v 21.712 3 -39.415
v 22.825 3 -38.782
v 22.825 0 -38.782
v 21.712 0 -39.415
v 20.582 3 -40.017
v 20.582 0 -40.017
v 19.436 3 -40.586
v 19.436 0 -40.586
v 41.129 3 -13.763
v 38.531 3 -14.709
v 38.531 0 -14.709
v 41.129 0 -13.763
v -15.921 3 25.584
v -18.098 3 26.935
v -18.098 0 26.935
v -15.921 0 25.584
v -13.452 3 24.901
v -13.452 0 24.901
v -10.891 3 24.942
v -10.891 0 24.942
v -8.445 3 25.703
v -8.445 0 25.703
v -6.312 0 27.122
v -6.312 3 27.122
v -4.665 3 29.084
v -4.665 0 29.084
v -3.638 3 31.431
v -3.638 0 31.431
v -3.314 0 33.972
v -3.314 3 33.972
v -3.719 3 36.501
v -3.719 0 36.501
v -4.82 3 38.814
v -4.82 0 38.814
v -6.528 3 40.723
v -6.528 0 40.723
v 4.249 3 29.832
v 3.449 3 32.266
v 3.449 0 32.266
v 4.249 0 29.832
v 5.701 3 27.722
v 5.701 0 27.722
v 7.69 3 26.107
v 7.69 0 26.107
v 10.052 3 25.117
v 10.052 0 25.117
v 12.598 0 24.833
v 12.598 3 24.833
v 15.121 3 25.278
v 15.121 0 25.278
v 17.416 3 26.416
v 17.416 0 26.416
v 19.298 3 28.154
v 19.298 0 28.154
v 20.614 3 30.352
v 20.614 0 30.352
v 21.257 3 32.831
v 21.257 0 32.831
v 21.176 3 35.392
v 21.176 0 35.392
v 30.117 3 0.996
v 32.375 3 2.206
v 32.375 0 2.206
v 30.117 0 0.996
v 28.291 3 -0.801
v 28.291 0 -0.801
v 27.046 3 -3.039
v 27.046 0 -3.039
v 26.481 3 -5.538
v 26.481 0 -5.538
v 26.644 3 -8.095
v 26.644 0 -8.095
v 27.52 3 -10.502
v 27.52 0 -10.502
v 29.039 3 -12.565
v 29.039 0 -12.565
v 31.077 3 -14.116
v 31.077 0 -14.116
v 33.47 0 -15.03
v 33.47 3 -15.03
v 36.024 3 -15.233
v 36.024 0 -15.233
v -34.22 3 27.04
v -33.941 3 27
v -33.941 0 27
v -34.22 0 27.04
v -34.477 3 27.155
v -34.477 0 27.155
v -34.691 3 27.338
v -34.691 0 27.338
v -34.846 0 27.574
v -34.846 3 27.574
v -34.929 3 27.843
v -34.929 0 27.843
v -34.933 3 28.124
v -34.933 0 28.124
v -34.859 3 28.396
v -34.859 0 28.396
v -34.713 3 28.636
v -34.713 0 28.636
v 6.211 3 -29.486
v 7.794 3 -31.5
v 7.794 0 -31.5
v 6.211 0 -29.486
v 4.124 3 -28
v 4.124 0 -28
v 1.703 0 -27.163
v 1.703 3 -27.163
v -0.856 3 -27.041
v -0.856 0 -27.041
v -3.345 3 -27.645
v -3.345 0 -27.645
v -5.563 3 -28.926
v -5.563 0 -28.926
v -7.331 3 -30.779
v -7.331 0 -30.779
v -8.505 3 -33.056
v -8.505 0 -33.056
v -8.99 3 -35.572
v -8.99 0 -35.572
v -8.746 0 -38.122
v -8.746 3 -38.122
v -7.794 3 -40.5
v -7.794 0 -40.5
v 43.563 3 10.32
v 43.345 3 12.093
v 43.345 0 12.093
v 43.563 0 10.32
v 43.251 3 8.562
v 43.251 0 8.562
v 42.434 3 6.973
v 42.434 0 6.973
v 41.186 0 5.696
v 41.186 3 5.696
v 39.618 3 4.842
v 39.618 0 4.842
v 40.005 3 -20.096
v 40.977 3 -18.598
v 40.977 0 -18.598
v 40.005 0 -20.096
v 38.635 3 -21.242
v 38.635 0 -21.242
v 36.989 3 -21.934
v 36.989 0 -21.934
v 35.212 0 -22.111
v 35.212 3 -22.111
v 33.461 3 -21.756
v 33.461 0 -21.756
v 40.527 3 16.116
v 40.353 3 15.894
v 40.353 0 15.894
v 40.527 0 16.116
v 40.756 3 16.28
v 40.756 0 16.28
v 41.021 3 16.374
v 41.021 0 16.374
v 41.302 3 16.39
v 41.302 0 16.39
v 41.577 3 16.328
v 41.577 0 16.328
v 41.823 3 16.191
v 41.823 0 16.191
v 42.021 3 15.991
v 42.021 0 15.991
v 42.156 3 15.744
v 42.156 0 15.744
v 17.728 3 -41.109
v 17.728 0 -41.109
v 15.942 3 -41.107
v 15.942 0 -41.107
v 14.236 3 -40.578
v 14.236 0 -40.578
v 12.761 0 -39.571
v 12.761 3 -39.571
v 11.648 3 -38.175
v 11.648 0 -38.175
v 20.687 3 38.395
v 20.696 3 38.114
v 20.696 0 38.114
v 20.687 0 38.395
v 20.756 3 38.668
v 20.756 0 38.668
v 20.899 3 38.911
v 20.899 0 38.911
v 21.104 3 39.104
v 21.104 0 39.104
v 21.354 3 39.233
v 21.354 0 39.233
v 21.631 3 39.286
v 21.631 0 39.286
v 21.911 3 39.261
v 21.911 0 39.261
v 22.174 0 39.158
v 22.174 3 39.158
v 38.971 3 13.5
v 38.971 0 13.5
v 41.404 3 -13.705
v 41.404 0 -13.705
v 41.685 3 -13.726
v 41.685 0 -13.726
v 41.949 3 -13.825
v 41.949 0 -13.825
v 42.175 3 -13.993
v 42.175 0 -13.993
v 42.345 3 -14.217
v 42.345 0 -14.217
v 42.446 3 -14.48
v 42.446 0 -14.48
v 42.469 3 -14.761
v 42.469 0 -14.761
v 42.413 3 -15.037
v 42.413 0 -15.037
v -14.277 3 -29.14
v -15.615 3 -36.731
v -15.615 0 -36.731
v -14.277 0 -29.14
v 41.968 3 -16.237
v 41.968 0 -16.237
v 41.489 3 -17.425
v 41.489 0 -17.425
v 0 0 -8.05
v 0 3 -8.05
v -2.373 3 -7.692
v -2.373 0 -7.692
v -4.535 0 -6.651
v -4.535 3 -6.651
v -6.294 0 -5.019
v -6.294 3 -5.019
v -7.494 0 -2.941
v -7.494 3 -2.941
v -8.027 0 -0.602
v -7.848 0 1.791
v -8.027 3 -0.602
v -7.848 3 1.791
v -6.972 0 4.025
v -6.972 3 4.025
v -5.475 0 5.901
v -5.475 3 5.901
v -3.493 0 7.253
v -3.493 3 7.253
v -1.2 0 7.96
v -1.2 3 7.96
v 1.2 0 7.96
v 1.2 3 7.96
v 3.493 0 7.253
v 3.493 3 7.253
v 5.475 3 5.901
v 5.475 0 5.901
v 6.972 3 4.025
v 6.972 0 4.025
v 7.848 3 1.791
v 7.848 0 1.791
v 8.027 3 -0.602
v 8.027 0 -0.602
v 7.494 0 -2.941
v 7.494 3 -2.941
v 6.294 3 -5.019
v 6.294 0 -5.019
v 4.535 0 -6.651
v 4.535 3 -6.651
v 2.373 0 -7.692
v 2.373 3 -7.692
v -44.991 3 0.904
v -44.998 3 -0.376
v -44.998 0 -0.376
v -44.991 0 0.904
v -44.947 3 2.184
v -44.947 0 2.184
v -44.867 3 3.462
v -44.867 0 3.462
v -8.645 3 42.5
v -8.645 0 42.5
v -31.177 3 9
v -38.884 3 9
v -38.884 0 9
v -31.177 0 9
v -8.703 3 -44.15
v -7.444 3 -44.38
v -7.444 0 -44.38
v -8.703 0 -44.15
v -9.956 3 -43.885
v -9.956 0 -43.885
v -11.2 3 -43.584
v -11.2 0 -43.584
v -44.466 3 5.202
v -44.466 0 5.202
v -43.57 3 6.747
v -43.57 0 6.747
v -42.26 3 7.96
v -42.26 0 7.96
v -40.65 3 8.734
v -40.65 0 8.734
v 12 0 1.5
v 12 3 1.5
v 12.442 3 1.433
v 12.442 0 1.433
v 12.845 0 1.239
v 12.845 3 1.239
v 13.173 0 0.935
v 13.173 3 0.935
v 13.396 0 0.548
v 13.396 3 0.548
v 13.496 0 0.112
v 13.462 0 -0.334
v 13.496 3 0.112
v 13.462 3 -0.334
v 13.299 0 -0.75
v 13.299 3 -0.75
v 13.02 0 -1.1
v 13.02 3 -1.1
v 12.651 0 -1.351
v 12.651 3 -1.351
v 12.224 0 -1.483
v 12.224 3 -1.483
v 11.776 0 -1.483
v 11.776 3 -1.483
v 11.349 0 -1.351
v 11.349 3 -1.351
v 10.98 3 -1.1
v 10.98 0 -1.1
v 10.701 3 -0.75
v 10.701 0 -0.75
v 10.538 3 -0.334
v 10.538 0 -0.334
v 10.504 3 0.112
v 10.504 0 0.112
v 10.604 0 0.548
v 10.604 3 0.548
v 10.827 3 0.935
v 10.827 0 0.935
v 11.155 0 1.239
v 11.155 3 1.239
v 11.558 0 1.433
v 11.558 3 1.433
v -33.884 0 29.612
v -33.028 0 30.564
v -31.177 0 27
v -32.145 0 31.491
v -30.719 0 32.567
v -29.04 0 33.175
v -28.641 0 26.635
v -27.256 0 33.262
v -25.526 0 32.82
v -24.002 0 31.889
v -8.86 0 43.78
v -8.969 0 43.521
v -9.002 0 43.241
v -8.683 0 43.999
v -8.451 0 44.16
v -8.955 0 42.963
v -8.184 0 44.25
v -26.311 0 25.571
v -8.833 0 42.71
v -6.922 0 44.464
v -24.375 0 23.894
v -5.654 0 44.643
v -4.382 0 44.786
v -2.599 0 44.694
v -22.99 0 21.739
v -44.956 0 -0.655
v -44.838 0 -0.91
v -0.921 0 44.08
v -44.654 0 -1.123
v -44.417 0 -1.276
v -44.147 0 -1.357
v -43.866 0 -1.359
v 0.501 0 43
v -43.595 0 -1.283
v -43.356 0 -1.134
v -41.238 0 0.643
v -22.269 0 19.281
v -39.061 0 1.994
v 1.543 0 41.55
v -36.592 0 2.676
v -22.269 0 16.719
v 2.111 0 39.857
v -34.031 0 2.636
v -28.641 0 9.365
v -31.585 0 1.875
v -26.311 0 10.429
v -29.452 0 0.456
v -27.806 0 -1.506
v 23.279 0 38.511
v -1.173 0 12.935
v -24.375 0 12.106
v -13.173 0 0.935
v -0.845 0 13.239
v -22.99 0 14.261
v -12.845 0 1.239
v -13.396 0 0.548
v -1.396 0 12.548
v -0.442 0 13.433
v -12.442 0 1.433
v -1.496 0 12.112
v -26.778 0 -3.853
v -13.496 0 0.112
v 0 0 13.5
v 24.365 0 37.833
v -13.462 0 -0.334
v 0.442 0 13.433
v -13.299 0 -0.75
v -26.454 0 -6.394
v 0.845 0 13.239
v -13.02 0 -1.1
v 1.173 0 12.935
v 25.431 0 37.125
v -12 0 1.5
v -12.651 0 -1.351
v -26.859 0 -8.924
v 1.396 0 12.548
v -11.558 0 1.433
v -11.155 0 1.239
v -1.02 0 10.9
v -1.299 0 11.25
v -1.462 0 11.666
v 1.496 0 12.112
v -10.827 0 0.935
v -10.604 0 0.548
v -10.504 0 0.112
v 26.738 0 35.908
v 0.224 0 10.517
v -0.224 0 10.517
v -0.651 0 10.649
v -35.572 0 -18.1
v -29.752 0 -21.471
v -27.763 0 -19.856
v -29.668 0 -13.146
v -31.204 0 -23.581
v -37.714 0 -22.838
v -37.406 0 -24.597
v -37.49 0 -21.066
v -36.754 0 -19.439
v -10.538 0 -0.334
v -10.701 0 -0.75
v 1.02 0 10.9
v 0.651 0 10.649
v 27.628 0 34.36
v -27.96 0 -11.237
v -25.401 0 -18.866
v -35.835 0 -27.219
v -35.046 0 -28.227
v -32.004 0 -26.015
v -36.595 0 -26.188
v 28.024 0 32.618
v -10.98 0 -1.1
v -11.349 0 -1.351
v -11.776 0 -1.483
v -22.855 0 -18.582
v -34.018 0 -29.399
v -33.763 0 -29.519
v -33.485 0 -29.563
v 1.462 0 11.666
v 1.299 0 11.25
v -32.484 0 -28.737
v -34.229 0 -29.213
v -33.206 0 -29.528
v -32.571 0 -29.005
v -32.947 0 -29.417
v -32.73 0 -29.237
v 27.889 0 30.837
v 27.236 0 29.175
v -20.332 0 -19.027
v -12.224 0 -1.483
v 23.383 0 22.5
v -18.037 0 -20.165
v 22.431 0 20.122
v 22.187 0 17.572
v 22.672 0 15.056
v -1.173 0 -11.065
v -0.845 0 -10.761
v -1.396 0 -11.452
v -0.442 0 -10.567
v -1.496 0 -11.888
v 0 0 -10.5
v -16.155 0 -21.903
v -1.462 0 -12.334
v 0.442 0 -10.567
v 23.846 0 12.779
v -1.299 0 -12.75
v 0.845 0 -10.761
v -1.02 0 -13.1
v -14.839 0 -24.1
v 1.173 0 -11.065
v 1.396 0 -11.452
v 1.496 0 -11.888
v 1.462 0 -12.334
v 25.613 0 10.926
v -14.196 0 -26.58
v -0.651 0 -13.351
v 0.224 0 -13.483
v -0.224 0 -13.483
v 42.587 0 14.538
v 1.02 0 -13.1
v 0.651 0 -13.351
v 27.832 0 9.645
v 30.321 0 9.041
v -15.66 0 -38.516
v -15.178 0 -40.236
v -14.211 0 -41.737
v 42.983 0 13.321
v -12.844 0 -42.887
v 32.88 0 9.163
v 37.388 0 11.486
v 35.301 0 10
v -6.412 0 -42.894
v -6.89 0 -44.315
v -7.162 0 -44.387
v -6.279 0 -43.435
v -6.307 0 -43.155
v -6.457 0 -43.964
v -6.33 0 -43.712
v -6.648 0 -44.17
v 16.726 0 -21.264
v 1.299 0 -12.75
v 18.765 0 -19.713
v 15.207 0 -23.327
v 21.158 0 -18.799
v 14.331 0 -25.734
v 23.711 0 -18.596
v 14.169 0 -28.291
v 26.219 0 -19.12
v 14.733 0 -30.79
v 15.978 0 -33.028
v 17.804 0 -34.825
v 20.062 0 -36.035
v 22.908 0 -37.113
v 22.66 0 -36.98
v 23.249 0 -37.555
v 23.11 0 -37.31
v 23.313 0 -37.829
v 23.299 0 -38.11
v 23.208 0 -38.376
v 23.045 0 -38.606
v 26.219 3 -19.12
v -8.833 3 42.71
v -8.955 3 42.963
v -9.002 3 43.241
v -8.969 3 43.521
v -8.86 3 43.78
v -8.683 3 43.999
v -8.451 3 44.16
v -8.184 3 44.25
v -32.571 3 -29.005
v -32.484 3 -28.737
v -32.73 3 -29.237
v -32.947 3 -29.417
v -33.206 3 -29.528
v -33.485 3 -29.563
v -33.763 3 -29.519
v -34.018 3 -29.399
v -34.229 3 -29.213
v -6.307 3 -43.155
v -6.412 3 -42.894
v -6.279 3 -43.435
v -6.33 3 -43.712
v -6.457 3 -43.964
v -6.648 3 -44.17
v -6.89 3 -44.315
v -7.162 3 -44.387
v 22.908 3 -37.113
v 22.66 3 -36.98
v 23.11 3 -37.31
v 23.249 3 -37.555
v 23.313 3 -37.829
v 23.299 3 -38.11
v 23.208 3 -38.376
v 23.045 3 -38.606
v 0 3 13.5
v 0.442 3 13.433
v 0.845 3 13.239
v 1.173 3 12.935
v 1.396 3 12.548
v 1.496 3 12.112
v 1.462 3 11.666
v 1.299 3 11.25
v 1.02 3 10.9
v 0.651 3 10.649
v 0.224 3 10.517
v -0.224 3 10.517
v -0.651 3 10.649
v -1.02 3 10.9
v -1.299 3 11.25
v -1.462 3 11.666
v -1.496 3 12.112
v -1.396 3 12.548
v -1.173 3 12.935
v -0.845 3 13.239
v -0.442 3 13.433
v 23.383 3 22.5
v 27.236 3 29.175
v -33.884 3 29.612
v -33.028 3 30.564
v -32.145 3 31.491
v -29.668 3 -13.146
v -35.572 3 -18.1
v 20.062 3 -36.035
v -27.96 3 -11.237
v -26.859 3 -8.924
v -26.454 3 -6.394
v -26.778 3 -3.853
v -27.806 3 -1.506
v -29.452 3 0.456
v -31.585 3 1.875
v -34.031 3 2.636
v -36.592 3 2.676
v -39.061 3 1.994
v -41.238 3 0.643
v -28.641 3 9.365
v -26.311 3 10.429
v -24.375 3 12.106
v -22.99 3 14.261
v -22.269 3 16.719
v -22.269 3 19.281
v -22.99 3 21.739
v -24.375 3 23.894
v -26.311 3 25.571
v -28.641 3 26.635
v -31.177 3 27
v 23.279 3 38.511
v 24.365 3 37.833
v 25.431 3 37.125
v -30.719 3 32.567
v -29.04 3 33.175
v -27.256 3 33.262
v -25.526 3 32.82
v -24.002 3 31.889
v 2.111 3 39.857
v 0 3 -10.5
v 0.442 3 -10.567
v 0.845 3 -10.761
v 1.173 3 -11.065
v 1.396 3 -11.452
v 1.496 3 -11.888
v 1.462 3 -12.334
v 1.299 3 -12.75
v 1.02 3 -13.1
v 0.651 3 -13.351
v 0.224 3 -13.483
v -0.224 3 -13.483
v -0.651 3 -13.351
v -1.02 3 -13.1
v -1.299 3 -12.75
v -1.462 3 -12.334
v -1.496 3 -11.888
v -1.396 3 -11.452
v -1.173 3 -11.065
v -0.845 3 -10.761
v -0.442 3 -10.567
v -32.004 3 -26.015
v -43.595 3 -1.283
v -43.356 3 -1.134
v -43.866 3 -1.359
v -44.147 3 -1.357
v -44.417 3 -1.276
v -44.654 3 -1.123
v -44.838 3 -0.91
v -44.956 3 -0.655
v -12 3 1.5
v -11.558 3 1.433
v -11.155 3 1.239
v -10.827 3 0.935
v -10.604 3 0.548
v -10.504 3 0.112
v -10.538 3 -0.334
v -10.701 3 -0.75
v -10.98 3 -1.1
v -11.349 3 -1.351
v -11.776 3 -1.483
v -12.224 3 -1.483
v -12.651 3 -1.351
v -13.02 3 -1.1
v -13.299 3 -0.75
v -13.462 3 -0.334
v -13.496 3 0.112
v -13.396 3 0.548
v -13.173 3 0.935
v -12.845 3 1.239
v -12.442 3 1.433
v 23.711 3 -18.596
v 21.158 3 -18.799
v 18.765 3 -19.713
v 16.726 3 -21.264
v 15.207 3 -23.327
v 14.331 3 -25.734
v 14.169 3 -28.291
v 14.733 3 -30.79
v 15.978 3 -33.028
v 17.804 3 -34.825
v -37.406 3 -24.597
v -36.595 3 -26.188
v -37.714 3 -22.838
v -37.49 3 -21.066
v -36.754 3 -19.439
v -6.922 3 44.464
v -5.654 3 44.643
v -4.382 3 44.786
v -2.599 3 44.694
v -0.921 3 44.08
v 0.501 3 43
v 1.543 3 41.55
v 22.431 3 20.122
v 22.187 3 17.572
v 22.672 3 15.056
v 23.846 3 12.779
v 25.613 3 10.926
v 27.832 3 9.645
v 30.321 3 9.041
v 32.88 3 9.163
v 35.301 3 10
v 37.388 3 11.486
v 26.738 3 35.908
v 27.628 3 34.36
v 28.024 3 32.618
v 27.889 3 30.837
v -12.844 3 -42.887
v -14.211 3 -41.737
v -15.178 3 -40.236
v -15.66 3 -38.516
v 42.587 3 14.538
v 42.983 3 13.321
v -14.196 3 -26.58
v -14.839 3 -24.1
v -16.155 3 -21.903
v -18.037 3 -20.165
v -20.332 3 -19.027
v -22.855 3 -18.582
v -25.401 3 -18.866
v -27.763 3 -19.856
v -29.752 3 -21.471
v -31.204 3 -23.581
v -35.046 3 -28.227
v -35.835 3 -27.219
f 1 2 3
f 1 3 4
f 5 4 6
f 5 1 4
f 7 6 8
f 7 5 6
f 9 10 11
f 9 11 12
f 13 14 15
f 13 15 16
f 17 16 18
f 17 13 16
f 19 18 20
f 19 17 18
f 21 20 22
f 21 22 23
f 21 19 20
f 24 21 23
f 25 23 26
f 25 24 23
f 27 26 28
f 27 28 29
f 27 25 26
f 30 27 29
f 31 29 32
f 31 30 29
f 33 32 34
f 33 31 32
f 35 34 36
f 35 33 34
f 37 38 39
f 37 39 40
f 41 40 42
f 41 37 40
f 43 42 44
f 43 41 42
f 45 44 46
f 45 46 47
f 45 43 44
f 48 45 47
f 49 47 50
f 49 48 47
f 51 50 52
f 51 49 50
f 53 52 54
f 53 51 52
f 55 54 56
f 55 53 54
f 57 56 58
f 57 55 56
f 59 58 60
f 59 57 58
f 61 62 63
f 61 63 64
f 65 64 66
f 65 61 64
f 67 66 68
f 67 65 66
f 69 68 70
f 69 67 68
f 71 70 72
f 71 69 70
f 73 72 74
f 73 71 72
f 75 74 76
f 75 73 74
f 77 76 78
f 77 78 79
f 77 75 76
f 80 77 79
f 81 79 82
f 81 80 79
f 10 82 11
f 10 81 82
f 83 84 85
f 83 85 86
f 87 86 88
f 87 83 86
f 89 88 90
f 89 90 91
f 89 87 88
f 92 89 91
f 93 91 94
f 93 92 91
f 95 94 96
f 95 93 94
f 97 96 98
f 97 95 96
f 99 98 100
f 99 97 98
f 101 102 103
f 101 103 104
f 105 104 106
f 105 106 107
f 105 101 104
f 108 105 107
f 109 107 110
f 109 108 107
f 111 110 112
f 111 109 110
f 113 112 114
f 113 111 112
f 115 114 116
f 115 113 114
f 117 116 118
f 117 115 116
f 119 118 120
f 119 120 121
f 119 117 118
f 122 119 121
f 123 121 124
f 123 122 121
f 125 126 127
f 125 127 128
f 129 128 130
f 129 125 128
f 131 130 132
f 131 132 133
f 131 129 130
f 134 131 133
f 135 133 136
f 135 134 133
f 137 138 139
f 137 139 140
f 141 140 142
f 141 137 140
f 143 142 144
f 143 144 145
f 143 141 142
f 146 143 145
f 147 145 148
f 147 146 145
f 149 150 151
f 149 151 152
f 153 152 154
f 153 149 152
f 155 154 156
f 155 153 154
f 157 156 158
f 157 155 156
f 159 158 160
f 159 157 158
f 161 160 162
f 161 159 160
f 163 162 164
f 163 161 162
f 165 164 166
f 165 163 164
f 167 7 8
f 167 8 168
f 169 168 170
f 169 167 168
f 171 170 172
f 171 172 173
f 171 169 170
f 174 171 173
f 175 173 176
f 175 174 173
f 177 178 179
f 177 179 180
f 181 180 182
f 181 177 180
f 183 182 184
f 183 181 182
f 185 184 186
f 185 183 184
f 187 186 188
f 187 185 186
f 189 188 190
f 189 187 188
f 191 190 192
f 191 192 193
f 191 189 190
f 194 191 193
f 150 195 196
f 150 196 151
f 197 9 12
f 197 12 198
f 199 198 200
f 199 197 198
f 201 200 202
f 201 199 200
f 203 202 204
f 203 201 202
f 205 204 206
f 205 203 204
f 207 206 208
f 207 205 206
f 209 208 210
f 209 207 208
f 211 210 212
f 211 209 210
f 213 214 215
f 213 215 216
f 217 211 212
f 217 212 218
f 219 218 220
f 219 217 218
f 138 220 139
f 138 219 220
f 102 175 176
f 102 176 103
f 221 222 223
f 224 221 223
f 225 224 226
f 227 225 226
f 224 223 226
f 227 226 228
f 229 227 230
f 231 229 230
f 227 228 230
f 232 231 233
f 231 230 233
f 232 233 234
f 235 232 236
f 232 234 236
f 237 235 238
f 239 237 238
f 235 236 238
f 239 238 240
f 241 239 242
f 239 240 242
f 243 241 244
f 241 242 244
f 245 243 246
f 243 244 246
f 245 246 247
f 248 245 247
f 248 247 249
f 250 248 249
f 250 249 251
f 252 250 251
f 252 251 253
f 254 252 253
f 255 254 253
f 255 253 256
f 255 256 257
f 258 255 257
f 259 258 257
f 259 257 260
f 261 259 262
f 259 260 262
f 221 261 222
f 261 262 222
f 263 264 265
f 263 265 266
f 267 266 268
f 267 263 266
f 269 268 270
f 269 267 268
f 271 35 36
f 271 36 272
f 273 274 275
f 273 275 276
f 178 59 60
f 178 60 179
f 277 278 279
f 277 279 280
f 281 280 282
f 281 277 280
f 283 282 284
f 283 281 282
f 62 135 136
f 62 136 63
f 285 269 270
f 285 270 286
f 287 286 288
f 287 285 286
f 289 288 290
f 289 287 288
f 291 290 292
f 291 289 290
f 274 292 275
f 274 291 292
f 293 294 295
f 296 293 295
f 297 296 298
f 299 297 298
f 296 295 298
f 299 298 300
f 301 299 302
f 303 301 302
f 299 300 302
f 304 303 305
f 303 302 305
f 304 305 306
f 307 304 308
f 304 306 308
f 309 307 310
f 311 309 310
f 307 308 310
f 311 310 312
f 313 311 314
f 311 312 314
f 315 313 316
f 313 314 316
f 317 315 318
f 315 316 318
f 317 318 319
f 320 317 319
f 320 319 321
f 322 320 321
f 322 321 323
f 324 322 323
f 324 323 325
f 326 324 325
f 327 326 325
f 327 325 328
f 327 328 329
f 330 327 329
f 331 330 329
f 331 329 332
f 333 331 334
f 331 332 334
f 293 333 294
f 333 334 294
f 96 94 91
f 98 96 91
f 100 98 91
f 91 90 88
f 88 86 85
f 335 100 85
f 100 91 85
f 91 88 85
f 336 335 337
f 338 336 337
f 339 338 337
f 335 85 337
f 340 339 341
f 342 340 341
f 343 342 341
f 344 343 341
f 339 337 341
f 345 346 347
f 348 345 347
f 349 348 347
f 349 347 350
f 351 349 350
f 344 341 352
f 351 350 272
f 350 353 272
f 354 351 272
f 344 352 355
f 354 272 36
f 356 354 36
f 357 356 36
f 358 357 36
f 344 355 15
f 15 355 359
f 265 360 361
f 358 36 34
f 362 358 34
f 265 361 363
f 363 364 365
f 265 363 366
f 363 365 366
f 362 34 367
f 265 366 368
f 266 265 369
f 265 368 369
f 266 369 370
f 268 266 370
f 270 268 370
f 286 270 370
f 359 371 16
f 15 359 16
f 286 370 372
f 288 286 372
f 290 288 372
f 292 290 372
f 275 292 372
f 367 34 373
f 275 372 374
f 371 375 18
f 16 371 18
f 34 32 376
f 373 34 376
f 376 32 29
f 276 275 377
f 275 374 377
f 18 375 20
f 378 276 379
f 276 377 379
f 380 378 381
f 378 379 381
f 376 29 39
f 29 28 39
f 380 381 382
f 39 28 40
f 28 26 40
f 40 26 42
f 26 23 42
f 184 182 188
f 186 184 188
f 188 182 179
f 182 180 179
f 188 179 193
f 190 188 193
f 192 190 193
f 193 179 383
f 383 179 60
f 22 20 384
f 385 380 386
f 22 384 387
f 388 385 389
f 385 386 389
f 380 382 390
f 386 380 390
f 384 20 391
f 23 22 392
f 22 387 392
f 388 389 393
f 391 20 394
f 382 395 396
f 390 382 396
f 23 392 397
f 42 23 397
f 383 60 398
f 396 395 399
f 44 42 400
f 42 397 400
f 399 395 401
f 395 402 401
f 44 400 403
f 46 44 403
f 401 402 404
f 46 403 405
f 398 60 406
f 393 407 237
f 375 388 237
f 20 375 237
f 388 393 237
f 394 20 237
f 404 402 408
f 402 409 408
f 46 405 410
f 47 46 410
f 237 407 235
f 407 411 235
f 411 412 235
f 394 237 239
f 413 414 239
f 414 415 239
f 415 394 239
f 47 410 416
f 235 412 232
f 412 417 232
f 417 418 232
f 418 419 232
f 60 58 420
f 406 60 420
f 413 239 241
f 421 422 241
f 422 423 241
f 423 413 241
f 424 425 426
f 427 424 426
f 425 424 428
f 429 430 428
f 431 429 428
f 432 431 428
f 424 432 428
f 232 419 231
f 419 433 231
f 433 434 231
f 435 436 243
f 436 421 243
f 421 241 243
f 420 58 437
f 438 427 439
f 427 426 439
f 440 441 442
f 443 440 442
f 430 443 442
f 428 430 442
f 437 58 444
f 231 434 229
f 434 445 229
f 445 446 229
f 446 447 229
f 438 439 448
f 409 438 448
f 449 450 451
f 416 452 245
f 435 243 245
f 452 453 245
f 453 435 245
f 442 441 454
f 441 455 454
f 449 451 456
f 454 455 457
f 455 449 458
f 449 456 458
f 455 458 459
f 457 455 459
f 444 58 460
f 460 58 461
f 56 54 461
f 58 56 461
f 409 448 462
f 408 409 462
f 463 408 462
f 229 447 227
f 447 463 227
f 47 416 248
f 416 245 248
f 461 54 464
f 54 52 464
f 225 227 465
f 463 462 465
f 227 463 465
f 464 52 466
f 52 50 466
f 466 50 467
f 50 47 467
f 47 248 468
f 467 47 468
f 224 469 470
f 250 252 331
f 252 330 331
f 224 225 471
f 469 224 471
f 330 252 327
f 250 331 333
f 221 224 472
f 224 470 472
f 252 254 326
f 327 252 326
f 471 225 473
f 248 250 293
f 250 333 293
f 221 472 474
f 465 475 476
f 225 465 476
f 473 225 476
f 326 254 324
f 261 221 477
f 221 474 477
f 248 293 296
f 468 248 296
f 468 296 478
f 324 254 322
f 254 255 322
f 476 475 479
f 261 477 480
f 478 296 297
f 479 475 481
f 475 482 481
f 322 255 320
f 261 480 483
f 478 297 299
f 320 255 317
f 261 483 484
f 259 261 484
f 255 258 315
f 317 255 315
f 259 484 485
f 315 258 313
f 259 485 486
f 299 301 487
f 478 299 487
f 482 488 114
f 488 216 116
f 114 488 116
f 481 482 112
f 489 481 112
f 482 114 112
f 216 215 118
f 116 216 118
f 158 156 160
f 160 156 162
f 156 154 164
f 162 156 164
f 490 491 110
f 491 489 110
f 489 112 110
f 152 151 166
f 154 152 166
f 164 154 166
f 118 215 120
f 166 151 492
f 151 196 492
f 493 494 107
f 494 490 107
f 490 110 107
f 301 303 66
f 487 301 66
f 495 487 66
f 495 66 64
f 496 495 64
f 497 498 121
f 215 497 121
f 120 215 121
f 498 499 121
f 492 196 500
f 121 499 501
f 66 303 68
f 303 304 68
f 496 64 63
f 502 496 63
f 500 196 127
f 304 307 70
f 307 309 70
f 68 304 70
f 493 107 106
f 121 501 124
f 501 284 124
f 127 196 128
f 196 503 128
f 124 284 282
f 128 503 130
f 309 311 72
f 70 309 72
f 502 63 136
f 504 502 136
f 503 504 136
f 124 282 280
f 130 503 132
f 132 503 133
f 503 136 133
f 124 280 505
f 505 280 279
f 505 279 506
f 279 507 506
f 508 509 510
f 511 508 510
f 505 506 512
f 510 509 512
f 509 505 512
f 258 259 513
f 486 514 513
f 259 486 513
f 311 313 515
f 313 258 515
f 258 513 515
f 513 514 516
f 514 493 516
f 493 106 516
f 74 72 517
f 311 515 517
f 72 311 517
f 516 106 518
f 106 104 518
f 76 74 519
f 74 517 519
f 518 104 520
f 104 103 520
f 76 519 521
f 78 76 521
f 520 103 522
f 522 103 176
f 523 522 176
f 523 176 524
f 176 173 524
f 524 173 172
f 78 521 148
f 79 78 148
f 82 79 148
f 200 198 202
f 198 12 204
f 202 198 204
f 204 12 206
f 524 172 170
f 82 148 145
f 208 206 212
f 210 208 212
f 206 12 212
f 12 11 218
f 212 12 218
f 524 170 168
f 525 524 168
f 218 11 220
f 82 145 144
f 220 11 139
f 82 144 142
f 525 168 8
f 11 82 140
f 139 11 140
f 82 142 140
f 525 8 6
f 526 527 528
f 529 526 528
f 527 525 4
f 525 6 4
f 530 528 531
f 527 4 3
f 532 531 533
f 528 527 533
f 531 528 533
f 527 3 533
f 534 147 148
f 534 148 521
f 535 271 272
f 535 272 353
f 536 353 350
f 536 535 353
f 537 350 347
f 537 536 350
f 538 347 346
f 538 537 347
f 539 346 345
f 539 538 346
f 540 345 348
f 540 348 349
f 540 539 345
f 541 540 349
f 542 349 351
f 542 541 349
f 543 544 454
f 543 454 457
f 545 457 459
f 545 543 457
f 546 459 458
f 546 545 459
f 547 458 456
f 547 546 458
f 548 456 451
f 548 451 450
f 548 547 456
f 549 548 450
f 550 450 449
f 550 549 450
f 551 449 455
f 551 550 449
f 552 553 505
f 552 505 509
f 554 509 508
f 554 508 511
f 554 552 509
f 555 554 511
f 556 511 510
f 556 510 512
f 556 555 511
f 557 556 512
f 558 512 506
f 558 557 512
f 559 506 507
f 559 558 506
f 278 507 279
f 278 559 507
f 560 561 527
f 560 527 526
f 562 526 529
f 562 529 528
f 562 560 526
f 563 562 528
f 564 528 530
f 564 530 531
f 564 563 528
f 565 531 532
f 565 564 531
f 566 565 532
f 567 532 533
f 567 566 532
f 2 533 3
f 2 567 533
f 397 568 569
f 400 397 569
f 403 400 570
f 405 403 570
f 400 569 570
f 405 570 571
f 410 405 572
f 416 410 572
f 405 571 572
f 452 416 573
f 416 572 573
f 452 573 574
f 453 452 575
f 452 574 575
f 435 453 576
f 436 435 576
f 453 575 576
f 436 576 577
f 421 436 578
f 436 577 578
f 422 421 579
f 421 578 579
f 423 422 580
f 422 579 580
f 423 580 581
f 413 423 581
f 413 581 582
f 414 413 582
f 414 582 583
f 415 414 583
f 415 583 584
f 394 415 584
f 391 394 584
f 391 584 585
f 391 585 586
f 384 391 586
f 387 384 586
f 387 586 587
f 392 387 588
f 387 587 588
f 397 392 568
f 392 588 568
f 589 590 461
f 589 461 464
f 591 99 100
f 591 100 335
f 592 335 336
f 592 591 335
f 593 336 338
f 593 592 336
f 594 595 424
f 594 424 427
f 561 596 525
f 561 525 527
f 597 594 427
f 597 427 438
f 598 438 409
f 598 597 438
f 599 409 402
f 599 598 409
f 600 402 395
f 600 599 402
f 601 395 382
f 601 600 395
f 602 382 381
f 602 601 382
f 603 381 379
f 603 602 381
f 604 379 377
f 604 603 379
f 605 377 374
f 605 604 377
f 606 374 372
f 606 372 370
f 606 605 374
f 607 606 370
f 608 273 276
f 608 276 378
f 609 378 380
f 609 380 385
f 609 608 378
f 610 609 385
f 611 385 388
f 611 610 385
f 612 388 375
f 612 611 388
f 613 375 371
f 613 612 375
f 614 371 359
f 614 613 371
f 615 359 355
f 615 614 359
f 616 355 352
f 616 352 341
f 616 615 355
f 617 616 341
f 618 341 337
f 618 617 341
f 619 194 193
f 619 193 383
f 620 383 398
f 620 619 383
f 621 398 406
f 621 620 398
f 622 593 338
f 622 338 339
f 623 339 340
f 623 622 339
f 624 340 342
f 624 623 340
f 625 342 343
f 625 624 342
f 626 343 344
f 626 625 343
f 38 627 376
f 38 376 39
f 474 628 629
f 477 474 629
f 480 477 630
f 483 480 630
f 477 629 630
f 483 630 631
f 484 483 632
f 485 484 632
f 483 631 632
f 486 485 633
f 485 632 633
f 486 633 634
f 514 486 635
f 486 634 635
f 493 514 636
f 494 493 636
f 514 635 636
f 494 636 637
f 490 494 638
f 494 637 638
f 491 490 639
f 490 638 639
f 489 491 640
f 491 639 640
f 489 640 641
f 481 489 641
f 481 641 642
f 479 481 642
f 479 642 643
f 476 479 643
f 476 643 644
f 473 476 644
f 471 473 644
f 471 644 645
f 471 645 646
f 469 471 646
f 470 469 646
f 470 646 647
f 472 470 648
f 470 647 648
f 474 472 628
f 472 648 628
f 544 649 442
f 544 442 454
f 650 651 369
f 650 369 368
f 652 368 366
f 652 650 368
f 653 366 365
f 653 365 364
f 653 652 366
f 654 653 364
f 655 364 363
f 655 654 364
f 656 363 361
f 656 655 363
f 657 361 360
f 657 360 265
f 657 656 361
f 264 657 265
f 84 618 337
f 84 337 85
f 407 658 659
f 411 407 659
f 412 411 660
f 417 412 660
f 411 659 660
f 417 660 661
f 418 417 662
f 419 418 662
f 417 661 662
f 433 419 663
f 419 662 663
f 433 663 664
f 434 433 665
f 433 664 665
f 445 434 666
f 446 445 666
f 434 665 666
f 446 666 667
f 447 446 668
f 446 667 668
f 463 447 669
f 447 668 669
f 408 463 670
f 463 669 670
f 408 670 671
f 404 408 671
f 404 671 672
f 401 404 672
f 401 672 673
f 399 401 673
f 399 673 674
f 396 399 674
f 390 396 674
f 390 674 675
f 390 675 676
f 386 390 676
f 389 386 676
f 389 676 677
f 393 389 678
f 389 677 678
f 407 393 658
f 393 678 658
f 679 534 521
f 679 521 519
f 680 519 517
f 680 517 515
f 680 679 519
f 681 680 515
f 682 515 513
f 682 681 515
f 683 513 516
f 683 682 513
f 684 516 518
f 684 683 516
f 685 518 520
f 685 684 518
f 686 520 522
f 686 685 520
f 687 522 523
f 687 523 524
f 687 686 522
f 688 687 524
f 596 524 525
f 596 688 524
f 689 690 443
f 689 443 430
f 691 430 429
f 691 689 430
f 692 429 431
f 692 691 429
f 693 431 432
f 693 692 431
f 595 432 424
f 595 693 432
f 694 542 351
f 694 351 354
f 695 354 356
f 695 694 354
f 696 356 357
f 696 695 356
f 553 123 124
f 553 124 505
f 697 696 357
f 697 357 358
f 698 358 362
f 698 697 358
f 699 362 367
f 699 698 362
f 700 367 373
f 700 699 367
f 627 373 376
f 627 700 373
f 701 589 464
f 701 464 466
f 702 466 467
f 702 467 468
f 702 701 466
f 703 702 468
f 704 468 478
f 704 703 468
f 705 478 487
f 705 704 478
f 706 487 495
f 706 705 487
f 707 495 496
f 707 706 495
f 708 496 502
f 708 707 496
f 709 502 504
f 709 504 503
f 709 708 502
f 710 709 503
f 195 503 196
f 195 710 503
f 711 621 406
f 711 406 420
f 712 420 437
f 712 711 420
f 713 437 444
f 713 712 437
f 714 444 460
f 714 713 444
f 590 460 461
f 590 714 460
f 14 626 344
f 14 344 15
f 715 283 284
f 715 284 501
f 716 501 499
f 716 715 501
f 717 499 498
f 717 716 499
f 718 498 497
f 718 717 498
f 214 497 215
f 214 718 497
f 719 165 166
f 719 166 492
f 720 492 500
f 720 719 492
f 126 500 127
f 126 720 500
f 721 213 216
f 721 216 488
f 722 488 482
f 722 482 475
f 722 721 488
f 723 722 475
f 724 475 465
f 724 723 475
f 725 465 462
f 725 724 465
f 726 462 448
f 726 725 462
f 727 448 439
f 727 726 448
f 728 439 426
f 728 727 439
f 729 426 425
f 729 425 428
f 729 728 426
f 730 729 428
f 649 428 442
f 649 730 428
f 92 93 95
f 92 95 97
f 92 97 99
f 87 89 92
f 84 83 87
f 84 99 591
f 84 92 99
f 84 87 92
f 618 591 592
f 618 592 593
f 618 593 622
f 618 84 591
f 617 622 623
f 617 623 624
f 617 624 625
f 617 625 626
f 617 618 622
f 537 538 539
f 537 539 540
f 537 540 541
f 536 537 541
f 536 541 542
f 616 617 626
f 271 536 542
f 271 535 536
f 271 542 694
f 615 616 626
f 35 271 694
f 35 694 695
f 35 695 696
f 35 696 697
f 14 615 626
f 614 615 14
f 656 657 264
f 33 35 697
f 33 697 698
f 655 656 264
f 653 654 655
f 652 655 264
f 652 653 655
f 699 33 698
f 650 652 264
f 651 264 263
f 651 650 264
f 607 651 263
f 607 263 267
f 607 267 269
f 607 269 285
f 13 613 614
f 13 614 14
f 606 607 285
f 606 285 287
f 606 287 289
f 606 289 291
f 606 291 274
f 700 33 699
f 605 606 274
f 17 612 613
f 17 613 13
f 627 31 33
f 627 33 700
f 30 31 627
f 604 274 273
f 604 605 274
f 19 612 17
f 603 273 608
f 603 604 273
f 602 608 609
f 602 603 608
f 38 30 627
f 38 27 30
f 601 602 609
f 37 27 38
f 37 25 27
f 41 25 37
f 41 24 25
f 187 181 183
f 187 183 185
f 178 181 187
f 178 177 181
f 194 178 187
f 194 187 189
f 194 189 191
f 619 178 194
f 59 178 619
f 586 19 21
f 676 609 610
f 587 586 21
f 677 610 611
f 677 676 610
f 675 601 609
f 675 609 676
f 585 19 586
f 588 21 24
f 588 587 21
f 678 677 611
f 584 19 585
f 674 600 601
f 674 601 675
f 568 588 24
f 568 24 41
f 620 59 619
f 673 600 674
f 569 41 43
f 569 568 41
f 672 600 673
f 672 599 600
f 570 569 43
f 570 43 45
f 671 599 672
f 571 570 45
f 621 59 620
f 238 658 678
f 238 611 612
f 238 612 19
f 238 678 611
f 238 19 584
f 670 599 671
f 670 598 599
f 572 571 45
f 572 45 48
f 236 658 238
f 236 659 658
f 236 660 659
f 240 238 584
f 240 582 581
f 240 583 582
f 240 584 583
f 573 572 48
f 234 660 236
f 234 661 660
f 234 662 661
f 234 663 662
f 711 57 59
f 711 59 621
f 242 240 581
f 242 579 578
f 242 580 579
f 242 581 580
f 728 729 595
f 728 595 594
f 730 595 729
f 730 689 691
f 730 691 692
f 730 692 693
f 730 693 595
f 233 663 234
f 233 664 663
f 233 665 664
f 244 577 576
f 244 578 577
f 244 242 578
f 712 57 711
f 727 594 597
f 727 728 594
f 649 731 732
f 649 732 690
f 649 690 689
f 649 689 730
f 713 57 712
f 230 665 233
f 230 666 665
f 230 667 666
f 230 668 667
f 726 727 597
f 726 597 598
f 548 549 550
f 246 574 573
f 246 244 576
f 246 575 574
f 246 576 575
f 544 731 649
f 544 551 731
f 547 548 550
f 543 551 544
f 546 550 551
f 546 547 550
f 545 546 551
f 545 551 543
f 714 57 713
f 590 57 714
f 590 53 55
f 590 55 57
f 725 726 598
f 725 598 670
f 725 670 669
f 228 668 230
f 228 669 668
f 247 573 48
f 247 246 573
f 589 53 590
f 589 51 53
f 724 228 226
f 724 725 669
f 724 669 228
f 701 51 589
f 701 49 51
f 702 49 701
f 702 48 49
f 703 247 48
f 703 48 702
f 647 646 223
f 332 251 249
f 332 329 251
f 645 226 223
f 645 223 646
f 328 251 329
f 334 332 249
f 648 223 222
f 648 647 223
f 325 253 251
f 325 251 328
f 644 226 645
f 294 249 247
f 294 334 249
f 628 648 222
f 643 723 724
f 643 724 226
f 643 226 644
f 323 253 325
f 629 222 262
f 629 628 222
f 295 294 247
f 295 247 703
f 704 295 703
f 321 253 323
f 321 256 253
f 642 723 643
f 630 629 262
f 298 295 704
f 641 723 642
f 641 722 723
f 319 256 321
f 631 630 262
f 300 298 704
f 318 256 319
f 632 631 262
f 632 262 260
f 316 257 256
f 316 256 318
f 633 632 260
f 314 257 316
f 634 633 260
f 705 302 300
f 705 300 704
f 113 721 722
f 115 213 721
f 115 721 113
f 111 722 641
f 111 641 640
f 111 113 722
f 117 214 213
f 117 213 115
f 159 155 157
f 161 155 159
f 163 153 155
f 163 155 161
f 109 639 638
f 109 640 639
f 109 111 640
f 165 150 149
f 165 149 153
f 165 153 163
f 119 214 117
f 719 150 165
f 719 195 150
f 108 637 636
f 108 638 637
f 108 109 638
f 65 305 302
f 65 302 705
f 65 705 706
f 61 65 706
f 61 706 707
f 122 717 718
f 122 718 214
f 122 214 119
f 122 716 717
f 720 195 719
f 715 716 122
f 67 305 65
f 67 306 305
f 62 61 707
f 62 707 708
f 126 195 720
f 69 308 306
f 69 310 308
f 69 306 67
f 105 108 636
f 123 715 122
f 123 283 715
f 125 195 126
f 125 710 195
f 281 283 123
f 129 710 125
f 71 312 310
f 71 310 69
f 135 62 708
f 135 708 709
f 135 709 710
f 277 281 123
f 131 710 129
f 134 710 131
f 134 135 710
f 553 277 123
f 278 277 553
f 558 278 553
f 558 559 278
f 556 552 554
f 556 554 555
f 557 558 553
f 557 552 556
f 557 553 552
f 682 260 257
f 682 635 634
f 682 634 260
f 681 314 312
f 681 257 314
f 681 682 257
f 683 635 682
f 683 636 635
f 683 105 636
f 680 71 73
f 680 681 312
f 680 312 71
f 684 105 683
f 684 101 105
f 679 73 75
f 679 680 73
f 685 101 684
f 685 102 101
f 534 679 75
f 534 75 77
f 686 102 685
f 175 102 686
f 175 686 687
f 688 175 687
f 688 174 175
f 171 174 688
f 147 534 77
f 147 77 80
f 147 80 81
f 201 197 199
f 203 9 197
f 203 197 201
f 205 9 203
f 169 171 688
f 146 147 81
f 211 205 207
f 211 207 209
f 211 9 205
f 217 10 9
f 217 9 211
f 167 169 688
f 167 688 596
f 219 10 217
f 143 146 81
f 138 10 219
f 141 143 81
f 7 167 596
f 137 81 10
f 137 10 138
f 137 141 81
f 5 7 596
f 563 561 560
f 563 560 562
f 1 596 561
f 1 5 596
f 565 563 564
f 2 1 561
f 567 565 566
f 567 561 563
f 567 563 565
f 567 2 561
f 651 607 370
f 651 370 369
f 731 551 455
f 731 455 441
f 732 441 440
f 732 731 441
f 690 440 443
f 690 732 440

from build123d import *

# Parameters (mm, degrees)
SKETCH_1_R      = 8.05
SKETCH_1_R_2    = 1.5
EXTRUDE_1_DEPTH = 3


with BuildPart() as part:
    # 草图1 → 凸台-拉伸1 (new body)
    with BuildSketch(Plane(origin=(0, 3, 0), x_dir=(1, 0, 0), z_dir=(0, 1, 0))):
        with BuildLine():
            Line((-38.88444419, -9), (-31.176914536, -9))
            ThreePointArc((-31.176914536, -9), (-22.176914536, -18), (-31.176914536, -27))
            Line((-31.176914536, -27), (-33.941125497, -27))
            ThreePointArc((-33.941125497, -27), (-34.845659531, -27.573598567), (-34.712514713, -28.636363636))
            ThreePointArc((-34.712514713, -28.636363636), (-33.459137261, -30.091296644), (-32.144826423, -31.491429536))
            ThreePointArc((-32.144826423, -31.491429536), (-28.151334956, -33.285439049), (-24.002123909, -31.888838923))
            Line((-24.002123909, -31.888838923), (-18.097813647, -26.93453436))
            ThreePointArc((-18.097813647, -26.93453436), (-5.418325172, -28.043845861), (-6.527636673, -40.723334336))
            Line((-6.527636673, -40.723334336), (-8.645145119, -42.500134892))
            ThreePointArc((-8.645145119, -42.500134892), (-8.969356337, -43.520960157), (-8.18422927, -44.249501593))
            ThreePointArc((-8.18422927, -44.249501593), (-6.288873528, -44.558389443), (-4.382064939, -44.786130742))
            ThreePointArc((-4.382064939, -44.786130742), (-0.169705906, -43.593454926), (2.111056904, -39.856535709))
            Line((2.111056904, -39.856535709), (3.449455383, -32.266100749))
            ThreePointArc((3.449455383, -32.266100749), (13.875558759, -24.965664571), (21.175994937, -35.391767947))
            Line((21.175994937, -35.391767947), (20.695994741, -38.113984332))
            ThreePointArc((20.695994741, -38.113984332), (21.10380837, -39.104380808), (22.173548005, -39.157805976))
            ThreePointArc((22.173548005, -39.157805976), (23.824024022, -38.17611661), (25.431113431, -37.124903632))
            ThreePointArc((25.431113431, -37.124903632), (27.891330424, -33.503608756), (27.236450729, -29.174916481))
            Line((27.236450729, -29.174916481), (23.382685902, -22.5))
            ThreePointArc((23.382685902, -22.5), (26.676914536, -10.205771366), (38.97114317, -13.5))
            Line((38.97114317, -13.5), (40.353248651, -15.893876913))
            ThreePointArc((40.353248651, -15.893876913), (41.302266598, -16.390427082), (42.156075737, -15.743737752))
            ThreePointArc((42.156075737, -15.743737752), (42.789395957, -13.930814535), (43.344791191, -12.092521515))
            ThreePointArc((43.344791191, -12.092521515), (42.901703271, -7.737051698), (39.617606559, -4.842029588))
            Line((39.617606559, -4.842029588), (32.374897819, -2.205899191))
            ThreePointArc((32.374897819, -2.205899191), (26.995845521, 9.329515686), (38.531260398, 14.708567983))
            Line((38.531260398, 14.708567983), (41.12876904, 13.763152154))
            ThreePointArc((41.12876904, 13.763152154), (42.174935261, 13.992789635), (42.41330712, 15.037000338))
            ThreePointArc((42.41330712, 15.037000338), (41.733133973, 16.832870485), (40.97695943, 18.598085813))
            ThreePointArc((40.97695943, 18.598085813), (37.837892358, 21.649757837), (33.461243979, 21.756496762))
            Line((33.461243979, 21.756496762), (26.218535239, 19.120366365))
            ThreePointArc((26.218535239, 19.120366365), (14.683120362, 24.499418662), (20.062172659, 36.034833539))
            Line((20.062172659, 36.034833539), (22.659681301, 36.980249368))
            ThreePointArc((22.659681301, 36.980249368), (23.313482993, 37.828624569), (22.824880729, 38.781758852))
            ThreePointArc((22.824880729, 38.781758852), (21.149474791, 39.720268328), (19.435552943, 40.586442093))
            ThreePointArc((19.435552943, 40.586442093), (15.06931109, 40.906405071), (11.647993461, 38.174916481))
            Line((11.647993461, 38.174916481), (7.794228634, 31.5))
            ThreePointArc((7.794228634, 31.5), (-4.5, 28.205771366), (-7.794228634, 40.5))
            Line((-7.794228634, 40.5), (-6.412123154, 42.893876913))
            ThreePointArc((-6.412123154, 42.893876913), (-6.456607068, 43.964025649), (-7.443561025, 44.380101389))
            ThreePointArc((-7.443561025, 44.380101389), (-9.330258696, 44.022111179), (-11.199964768, 43.583951051))
            ThreePointArc((-11.199964768, 43.583951051), (-14.750368314, 41.022490747), (-15.61548265, 36.730868511))
            Line((-15.61548265, 36.730868511), (-14.277084172, 29.140433551))
            ThreePointArc((-14.277084172, 29.140433551), (-21.57752035, 18.714330175), (-32.003623726, 26.014766353))
            Line((-32.003623726, 26.014766353), (-32.483623922, 28.736982738))
            ThreePointArc((-32.483623922, 28.736982738), (-33.205578925, 29.528170522), (-34.229077849, 29.212501255))
            ThreePointArc((-34.229077849, 29.212501255), (-35.444260445, 27.725518958), (-36.59489449, 26.18804493))
            ThreePointArc((-36.59489449, 26.18804493), (-37.668186452, 21.943697089), (-35.572300883, 18.100038947))
            Line((-35.572300883, 18.100038947), (-29.667990621, 13.145734384))
            ThreePointArc((-29.667990621, 13.145734384), (-28.55867912, 0.466245909), (-41.238167596, -0.643065592))
            Line((-41.238167596, -0.643065592), (-43.355676042, 1.133734964))
            ThreePointArc((-43.355676042, 1.133734964), (-44.417291364, 1.275756238), (-44.998428734, 0.376047124))
            ThreePointArc((-44.998428734, 0.376047124), (-44.973498813, -1.544151718), (-44.866666374, -3.461538462))
            ThreePointArc((-44.866666374, -3.461538462), (-42.960641513, -7.402796314), (-38.88444419, -9))
        make_face()
        with Locations(Location((0, 0, 0), (0, 0, 90))):
            Circle(SKETCH_1_R, mode=Mode.SUBTRACT)
        with Locations(Location((0, 12, 0), (0, 0, 270))):
            Circle(SKETCH_1_R_2, mode=Mode.SUBTRACT)
        with Locations(Location((12, 0, 0), (0, 0, 270))):
            Circle(SKETCH_1_R_2, mode=Mode.SUBTRACT)
        with Locations(Location((0, -12, 0), (0, 0, 270))):
            Circle(SKETCH_1_R_2, mode=Mode.SUBTRACT)
        with Locations(Location((-12, 0, 0), (0, 0, 270))):
            Circle(SKETCH_1_R_2, mode=Mode.SUBTRACT)
    extrude(amount=-EXTRUDE_1_DEPTH)


solid = part.part
